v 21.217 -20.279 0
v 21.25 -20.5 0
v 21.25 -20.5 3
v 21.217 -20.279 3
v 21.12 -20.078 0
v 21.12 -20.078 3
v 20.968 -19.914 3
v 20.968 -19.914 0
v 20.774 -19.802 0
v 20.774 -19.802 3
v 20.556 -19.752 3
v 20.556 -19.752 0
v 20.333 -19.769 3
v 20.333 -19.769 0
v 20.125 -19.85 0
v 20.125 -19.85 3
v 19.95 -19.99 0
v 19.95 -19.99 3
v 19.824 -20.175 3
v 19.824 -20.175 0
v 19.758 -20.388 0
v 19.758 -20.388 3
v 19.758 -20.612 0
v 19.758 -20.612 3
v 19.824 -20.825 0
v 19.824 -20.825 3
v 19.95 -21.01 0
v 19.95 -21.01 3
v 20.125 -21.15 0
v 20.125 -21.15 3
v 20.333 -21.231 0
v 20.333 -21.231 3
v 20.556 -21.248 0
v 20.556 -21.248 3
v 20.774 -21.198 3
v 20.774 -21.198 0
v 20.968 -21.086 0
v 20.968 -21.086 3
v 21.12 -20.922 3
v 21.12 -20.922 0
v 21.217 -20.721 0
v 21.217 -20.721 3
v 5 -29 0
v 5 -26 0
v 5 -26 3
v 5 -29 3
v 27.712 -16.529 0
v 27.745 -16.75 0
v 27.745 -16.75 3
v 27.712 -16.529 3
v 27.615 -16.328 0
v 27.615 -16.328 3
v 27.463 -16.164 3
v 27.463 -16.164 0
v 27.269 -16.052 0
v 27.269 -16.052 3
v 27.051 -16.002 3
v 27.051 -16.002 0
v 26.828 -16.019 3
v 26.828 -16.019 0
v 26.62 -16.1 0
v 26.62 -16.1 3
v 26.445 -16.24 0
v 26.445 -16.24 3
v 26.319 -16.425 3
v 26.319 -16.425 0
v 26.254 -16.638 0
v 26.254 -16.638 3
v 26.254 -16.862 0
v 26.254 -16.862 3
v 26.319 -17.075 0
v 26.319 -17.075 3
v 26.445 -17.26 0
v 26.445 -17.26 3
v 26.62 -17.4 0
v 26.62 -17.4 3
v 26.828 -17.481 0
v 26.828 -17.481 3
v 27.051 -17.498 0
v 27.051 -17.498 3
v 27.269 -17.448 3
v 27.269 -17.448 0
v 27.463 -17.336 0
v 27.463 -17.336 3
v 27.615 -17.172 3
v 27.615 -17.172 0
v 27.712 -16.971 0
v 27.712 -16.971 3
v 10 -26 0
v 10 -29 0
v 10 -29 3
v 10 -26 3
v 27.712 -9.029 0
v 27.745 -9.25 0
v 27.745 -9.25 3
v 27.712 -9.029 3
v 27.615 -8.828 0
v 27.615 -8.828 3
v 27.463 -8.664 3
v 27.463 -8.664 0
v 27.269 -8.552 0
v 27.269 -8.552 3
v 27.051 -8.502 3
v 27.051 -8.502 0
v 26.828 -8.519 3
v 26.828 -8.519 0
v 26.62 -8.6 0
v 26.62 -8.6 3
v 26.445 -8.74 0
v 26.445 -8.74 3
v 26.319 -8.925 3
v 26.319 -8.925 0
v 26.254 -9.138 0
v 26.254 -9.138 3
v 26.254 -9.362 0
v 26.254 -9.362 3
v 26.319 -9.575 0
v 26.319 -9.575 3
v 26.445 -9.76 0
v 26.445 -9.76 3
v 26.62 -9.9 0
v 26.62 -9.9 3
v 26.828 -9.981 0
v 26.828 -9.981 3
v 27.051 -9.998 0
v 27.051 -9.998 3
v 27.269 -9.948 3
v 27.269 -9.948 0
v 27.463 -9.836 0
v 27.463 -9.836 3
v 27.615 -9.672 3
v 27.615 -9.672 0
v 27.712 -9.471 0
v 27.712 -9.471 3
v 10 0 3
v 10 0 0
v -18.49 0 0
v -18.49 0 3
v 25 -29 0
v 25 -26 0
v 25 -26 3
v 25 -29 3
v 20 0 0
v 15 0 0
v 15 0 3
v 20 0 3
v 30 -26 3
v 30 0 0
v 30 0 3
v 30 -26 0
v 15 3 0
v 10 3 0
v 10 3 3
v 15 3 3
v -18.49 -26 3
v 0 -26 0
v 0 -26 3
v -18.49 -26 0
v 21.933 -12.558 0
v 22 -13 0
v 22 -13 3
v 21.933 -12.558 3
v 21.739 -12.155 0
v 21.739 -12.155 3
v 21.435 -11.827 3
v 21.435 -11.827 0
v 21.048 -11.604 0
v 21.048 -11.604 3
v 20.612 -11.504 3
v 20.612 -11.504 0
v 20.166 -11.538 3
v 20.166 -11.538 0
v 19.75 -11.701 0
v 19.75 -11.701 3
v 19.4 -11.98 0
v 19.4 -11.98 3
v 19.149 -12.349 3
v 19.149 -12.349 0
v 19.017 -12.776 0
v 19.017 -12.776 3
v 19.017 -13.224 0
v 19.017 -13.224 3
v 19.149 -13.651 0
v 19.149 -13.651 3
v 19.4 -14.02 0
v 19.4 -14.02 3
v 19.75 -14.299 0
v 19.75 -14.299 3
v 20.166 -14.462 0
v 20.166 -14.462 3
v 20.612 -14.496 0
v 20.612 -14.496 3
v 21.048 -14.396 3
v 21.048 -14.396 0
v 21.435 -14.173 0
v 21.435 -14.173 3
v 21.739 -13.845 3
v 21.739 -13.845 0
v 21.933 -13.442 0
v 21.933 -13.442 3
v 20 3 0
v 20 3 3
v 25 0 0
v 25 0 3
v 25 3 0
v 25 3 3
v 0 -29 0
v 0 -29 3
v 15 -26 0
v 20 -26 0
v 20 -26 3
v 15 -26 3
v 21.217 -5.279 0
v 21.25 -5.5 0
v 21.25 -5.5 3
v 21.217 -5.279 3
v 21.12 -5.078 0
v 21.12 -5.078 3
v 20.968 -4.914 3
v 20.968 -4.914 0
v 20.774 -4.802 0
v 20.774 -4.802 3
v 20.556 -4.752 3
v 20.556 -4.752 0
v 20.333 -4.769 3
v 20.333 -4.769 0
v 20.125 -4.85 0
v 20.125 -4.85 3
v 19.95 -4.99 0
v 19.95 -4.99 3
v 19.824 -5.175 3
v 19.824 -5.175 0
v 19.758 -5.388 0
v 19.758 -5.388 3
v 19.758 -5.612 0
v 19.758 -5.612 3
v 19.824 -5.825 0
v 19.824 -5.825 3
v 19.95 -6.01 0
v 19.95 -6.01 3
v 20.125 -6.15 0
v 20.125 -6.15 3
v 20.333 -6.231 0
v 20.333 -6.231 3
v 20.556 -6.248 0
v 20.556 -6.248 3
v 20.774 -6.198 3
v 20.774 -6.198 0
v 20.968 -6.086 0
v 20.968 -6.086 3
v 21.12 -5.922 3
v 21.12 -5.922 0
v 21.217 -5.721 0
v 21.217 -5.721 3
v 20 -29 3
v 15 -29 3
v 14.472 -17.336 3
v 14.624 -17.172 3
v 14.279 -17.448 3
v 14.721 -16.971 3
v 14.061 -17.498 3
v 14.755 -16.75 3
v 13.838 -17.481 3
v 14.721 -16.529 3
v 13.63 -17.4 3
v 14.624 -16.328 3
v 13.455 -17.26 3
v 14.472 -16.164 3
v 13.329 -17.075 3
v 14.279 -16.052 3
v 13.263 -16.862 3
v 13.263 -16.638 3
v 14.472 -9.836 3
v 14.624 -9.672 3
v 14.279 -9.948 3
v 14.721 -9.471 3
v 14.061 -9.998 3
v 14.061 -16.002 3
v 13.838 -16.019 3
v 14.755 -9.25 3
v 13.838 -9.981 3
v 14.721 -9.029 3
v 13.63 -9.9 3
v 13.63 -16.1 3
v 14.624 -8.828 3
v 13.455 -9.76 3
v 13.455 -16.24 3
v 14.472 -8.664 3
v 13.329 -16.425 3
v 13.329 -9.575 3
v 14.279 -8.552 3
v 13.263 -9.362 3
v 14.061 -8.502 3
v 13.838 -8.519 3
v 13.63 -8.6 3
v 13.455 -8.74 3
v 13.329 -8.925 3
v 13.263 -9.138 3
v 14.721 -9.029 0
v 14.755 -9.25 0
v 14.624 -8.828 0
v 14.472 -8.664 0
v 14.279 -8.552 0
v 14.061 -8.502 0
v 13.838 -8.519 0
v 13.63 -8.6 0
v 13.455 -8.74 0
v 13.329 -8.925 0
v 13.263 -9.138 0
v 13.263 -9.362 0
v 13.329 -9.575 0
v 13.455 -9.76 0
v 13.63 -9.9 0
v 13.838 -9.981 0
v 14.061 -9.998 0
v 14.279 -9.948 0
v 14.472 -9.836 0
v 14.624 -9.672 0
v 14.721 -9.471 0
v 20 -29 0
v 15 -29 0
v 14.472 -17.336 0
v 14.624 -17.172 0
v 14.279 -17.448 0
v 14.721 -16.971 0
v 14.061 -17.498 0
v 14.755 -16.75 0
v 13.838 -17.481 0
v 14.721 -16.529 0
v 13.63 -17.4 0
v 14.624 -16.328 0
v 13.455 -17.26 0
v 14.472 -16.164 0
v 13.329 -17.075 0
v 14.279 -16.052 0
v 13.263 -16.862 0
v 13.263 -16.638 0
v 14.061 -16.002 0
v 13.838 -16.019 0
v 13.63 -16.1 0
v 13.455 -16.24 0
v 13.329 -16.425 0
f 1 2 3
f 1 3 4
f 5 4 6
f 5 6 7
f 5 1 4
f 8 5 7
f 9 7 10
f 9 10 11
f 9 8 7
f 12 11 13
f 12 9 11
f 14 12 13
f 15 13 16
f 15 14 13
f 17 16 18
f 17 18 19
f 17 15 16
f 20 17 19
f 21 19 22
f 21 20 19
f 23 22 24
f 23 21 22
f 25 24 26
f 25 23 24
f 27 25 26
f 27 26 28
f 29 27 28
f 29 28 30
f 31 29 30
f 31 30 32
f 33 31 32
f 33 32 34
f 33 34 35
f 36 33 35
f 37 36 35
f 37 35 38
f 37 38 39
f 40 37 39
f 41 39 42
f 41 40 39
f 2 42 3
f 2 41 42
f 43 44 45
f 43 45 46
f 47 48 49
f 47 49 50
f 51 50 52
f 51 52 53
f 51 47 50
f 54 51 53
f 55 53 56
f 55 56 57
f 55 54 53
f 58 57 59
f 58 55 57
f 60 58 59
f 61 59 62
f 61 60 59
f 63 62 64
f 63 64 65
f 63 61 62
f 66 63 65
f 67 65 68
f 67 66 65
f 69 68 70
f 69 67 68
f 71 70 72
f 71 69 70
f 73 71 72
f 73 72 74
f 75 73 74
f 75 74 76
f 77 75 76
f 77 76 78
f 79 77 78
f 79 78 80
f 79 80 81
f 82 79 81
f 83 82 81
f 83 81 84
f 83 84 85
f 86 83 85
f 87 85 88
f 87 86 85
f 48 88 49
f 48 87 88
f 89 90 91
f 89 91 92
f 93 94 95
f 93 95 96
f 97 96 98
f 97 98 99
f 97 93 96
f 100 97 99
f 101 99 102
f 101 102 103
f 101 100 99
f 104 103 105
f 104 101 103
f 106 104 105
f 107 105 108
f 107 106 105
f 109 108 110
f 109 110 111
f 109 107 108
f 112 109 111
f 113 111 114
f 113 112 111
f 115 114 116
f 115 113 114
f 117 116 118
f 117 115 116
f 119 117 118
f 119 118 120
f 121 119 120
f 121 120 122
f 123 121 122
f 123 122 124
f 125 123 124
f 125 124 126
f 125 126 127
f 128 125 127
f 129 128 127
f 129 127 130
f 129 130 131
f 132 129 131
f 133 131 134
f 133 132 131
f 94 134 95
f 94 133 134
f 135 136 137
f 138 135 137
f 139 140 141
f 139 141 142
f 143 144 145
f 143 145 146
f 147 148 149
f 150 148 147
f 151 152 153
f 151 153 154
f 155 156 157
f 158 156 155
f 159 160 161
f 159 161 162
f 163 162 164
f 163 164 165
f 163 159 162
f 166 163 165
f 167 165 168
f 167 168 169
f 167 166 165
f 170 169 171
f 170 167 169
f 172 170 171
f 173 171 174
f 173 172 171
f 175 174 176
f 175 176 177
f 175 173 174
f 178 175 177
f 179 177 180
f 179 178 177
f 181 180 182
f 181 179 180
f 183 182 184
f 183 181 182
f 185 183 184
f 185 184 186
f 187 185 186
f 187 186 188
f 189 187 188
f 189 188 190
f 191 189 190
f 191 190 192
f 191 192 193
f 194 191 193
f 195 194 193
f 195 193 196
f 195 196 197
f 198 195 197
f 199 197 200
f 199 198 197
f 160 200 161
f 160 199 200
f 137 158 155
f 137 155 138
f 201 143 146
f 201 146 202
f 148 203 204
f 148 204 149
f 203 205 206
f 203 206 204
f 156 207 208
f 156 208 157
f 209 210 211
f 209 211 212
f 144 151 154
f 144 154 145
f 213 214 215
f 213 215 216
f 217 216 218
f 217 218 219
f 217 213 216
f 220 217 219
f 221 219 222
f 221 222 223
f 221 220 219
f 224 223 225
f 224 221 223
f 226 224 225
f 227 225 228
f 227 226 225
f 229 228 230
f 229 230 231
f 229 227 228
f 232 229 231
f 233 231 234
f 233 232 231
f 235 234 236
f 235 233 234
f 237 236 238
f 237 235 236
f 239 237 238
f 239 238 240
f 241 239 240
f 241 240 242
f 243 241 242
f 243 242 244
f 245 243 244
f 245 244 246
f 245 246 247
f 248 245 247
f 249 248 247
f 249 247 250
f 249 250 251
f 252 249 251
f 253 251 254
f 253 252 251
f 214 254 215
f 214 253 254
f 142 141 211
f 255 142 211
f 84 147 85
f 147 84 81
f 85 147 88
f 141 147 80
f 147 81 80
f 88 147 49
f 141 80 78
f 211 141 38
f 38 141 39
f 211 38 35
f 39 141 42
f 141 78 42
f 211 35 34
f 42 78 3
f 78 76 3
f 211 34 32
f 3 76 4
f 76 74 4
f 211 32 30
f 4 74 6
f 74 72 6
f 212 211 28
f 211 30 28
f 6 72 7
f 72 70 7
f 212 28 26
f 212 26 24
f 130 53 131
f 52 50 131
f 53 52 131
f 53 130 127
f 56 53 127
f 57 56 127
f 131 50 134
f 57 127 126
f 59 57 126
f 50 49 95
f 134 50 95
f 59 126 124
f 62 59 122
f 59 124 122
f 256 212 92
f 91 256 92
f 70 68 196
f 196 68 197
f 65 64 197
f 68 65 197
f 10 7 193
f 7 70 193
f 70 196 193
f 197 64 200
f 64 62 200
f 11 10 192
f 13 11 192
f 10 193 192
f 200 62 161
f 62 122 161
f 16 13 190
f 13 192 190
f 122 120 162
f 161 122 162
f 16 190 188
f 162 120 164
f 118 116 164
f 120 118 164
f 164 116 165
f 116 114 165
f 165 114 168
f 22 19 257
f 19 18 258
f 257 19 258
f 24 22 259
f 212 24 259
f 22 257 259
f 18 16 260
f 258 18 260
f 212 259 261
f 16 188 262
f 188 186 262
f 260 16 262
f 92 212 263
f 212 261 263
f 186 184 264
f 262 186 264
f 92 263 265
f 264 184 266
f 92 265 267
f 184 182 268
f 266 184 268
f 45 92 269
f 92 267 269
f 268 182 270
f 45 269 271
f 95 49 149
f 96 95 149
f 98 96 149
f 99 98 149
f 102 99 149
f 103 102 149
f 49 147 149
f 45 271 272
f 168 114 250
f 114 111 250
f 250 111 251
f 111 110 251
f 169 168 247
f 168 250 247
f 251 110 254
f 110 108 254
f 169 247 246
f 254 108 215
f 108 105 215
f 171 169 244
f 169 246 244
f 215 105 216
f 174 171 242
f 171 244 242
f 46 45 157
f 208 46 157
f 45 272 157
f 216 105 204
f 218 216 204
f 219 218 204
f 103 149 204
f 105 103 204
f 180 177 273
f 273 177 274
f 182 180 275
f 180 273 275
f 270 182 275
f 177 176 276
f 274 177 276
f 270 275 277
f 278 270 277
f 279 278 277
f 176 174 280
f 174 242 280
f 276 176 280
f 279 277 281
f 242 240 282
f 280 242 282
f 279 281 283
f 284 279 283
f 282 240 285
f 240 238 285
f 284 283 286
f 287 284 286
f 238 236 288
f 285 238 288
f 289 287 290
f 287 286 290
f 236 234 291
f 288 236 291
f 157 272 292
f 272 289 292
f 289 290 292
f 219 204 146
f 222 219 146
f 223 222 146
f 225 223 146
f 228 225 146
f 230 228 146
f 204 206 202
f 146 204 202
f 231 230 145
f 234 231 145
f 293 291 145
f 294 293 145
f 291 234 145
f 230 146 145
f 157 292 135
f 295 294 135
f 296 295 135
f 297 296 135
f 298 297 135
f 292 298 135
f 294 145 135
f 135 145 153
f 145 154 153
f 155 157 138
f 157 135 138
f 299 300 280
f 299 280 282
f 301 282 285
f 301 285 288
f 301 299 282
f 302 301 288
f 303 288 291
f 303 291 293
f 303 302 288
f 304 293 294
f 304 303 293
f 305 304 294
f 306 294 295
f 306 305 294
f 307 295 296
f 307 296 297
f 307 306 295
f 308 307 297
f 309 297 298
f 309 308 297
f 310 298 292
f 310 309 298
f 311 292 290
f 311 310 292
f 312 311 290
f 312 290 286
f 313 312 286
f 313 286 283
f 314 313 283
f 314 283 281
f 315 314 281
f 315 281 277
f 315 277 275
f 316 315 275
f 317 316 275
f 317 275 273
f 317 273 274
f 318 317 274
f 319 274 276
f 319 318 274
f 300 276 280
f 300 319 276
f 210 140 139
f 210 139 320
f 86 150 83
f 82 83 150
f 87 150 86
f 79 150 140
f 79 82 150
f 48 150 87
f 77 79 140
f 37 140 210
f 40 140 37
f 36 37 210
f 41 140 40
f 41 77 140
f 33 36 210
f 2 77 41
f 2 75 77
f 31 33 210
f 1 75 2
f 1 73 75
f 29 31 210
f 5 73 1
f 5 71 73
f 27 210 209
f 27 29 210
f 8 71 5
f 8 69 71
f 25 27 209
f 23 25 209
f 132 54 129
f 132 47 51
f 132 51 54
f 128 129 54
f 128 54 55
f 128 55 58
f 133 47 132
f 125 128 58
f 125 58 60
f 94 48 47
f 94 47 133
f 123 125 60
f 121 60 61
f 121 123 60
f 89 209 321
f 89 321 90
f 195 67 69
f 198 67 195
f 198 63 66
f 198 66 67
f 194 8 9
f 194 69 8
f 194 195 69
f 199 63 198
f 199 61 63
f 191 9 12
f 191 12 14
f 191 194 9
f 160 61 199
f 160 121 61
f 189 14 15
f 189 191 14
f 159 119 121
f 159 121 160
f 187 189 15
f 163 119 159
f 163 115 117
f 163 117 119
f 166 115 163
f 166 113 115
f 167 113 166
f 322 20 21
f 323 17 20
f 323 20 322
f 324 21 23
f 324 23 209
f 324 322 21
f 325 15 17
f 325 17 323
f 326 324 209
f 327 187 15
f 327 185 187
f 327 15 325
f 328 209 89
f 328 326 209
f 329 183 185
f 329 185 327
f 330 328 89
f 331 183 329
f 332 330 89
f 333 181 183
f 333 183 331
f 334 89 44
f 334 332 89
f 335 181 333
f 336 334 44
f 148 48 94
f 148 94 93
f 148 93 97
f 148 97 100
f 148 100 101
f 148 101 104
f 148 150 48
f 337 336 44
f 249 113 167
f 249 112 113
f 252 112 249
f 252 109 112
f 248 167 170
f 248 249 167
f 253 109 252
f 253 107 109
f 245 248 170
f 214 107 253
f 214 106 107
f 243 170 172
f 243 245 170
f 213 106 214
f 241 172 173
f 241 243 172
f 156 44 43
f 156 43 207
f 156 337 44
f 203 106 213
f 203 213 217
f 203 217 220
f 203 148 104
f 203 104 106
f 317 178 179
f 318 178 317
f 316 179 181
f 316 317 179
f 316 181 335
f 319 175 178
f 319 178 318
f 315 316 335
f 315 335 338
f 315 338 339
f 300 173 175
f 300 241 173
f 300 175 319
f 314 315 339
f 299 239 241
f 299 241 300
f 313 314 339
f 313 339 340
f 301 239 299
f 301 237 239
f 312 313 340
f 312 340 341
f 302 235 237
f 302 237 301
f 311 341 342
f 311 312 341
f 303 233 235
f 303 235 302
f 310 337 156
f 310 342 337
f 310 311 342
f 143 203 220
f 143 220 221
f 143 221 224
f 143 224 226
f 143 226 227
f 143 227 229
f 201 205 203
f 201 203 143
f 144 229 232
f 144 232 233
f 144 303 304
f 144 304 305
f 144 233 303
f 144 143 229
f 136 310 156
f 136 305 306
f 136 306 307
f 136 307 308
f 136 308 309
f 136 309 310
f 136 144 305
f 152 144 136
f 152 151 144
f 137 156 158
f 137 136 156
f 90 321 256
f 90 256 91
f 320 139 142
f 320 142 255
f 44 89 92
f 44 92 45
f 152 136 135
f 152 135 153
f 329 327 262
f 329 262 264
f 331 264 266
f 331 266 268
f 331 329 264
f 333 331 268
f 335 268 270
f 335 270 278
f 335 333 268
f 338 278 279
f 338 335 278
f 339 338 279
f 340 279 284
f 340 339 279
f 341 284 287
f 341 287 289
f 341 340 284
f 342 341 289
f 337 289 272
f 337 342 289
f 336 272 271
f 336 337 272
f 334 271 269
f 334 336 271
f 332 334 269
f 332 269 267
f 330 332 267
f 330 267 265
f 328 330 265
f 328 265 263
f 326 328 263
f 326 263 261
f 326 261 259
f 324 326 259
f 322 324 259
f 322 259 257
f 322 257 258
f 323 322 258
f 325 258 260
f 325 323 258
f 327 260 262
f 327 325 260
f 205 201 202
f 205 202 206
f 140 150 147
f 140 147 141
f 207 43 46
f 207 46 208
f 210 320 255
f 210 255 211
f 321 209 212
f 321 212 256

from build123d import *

# Parameters (mm, degrees)
SKETCH1_R           = 0.75
SKETCH1_R_2         = 1.5
BOSS_EXTRUDE1_DEPTH = 3


with BuildPart() as part:
    # Sketch1 → Boss-Extrude1 (new body)
    with BuildSketch(Plane.XY):
        Polygon((10, 0), (10, 3), (15, 3), (15, 0), (20, 0), (20, 3), (25, 3), (25, 0), (30, 0), (30, -26), (25, -26), (25, -29), (20, -29), (20, -26), (15, -26), (15, -29), (10, -29), (10, -26), (5, -26), (5, -29), (0, -29), (0, -26), (-18.49, -26), (-18.49, 0), (0, 0), align=None)
        with Locations((20.5, -5.5)):
            Circle(SKETCH1_R, mode=Mode.SUBTRACT)
        with Locations((26.995190528, -9.25)):
            Circle(SKETCH1_R, mode=Mode.SUBTRACT)
        with Locations((26.995190528, -16.75)):
            Circle(SKETCH1_R, mode=Mode.SUBTRACT)
        with Locations((20.5, -20.5)):
            Circle(SKETCH1_R, mode=Mode.SUBTRACT)
        with Locations((14.004809472, -16.75)):
            Circle(SKETCH1_R, mode=Mode.SUBTRACT)
        with Locations((14.004809472, -9.25)):
            Circle(SKETCH1_R, mode=Mode.SUBTRACT)
        with Locations((20.5, -13)):
            Circle(SKETCH1_R_2, mode=Mode.SUBTRACT)
    extrude(amount=BOSS_EXTRUDE1_DEPTH)


solid = part.part
